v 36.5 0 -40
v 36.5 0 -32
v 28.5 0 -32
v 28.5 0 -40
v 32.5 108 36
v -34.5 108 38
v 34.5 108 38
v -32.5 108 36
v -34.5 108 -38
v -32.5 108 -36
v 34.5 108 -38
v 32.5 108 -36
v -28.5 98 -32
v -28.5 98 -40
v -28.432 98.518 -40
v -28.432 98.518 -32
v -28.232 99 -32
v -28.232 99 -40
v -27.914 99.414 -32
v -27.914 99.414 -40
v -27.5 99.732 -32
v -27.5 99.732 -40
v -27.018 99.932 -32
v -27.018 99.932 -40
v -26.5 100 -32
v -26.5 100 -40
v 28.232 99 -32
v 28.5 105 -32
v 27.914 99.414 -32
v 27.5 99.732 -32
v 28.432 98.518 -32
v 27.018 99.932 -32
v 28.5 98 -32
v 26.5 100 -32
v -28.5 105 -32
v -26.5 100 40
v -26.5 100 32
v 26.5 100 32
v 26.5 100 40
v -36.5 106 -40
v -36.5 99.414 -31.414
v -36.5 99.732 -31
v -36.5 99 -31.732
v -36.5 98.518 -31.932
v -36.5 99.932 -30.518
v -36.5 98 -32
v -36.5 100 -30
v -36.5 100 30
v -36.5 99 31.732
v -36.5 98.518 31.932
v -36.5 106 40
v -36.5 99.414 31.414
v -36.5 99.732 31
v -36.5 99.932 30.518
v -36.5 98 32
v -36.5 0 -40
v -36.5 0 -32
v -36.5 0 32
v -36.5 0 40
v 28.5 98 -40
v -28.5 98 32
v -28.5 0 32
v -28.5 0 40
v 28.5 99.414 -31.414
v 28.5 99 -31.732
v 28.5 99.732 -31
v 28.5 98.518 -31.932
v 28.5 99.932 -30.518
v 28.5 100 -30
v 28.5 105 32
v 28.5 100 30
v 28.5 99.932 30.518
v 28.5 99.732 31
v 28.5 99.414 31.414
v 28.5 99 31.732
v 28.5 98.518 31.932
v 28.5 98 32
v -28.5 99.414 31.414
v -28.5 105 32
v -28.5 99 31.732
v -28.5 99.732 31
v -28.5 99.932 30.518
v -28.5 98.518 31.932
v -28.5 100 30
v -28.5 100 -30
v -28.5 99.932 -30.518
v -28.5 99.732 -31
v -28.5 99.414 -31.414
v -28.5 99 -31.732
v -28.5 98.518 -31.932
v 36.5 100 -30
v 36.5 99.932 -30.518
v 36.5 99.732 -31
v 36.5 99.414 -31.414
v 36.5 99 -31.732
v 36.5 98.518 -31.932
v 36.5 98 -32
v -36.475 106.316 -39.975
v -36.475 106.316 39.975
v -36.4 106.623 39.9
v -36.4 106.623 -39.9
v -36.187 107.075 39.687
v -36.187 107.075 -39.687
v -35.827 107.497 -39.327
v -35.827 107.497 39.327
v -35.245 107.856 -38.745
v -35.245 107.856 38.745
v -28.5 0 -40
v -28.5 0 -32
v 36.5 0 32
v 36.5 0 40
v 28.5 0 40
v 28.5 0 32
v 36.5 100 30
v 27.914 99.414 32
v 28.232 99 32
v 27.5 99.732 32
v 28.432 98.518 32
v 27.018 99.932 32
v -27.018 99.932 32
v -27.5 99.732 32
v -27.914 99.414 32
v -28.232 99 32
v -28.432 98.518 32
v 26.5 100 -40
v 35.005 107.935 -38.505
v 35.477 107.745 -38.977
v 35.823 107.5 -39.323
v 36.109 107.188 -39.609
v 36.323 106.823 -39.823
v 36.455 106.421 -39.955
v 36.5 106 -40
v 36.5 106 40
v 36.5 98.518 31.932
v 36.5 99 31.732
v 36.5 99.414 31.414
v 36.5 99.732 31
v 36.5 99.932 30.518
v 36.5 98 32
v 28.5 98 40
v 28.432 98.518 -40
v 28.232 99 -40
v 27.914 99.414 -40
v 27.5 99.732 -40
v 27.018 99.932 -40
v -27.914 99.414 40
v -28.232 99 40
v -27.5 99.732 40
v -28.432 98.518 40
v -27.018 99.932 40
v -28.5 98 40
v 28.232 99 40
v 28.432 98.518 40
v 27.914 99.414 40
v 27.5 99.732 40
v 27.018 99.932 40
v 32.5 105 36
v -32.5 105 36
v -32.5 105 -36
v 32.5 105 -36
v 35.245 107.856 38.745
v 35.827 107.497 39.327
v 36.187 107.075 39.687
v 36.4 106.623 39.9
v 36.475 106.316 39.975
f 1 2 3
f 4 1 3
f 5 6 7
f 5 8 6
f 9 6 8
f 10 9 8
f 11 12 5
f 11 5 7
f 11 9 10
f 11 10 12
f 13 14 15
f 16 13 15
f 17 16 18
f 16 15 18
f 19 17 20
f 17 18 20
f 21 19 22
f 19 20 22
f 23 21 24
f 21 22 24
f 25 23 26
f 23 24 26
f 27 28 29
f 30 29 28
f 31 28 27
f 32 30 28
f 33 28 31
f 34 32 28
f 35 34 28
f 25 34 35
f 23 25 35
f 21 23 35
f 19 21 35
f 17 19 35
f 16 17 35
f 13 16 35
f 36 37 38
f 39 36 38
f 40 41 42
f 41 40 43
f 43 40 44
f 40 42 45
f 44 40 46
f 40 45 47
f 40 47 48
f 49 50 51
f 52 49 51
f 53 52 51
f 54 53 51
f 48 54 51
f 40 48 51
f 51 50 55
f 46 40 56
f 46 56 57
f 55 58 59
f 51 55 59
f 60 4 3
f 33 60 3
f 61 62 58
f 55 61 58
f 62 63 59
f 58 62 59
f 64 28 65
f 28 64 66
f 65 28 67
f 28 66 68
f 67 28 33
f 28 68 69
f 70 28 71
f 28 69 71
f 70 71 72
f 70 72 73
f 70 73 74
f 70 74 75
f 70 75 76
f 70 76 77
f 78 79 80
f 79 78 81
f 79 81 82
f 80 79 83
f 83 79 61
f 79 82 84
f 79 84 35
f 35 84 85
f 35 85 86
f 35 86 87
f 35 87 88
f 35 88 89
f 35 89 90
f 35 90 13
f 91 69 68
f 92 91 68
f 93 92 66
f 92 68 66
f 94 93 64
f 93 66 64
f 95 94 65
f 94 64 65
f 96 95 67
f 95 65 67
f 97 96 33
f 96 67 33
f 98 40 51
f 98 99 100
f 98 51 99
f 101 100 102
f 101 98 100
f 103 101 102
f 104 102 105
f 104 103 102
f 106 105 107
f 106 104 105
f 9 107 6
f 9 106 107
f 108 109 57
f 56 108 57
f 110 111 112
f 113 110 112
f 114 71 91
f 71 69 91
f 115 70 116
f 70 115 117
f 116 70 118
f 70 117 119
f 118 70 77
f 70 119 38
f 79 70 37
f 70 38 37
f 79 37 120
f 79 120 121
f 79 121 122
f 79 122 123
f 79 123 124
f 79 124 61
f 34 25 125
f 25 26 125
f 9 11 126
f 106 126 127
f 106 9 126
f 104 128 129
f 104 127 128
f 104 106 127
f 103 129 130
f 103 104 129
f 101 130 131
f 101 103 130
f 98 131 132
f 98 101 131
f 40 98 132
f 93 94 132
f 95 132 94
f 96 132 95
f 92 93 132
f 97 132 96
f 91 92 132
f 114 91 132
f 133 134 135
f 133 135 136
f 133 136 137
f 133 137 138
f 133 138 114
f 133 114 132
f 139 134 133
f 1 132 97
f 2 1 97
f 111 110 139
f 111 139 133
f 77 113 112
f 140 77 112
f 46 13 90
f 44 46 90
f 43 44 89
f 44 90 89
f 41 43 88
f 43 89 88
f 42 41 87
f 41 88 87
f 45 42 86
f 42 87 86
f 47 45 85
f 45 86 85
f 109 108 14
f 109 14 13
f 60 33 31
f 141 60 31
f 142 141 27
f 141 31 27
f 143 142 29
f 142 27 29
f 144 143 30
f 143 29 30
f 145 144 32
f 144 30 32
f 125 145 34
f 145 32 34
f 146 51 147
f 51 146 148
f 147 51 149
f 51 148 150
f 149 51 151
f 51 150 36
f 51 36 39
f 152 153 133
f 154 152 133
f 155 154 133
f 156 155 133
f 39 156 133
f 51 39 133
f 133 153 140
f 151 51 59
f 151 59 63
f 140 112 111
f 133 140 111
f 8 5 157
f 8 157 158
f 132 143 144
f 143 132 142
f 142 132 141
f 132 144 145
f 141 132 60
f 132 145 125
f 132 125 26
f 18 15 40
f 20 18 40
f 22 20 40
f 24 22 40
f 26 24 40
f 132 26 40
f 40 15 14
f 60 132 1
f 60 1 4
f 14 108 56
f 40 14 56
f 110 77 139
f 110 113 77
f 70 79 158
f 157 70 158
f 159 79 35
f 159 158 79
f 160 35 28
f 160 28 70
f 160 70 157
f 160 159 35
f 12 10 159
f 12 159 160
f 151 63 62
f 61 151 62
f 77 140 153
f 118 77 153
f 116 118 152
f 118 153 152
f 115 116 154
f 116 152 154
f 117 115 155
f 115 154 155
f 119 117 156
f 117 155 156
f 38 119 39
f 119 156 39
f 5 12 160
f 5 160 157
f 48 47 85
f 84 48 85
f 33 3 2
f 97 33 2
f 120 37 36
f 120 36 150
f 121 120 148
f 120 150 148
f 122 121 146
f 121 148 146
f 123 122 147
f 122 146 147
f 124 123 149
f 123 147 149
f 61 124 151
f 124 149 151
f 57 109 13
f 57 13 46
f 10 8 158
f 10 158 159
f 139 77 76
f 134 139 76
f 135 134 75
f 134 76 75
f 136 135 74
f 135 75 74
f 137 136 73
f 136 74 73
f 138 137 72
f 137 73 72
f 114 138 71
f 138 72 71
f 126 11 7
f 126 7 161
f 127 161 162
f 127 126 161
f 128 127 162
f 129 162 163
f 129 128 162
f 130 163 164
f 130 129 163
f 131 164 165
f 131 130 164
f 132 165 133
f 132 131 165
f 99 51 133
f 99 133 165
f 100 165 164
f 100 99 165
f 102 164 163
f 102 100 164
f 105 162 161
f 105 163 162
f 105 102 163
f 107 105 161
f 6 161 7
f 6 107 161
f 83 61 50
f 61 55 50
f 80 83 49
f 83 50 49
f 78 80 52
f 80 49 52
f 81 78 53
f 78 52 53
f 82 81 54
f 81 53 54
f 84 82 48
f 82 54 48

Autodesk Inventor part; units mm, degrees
ref_plane "YZ Plane" through (0, 0, 0) normal (1, 0, 0) x (0, 1, 0)
ref_plane "XZ Plane" through (0, 0, 0) normal (0, 1, 0) x (-1, 0, 0)
ref_plane "XY Plane" through (0, 0, 0) normal (0, 0, 1) x (1, 0, 0)
sketch "Sketch1" plane through (0, 0, 0) normal (0, 1, 0) x (-1, 0, 0)
  line L0 (-36.5, -40) -> (-36.5, 40)
  line L1 (36.5, 40) -> (36.5, -40)
  line L2 (-36.5, 40) -> (36.5, -40) construction
  line L3 (36.5, 40) -> (-36.5, -40) construction
  line L4 (36.5, 40) -> (36.5, 13)
  line L5 (-36.5, 40) -> (36.5, 40)
  line L6 (-36.5, -40) -> (-9.5, -40)
  line L7 (-36.5, -40) -> (18.5, -40)
  line L8 (36.5, -40) -> (-36.5, -40)
  line L9 (36.5, -40) -> (28.5, -40)
  line L10 (28.5, -40) -> (28.5, -32)
  line L11 (28.5, -32) -> (36.5, -32)
  line L12 (36.5, -32) -> (36.5, -40)
  line L13 (36.5, 40) -> (28.5, 40)
  line L14 (28.5, 40) -> (28.5, 32)
  line L15 (28.5, 32) -> (36.5, 32)
  line L16 (36.5, 32) -> (36.5, 40)
  line L17 (-36.5, 40) -> (-28.5, 40)
  line L18 (-28.5, 40) -> (-28.5, 32)
  line L19 (-28.5, 32) -> (-36.5, 32)
  line L20 (-36.5, 32) -> (-36.5, 40)
  line L21 (-36.5, -40) -> (-28.5, -40)
  line L22 (-28.5, -40) -> (-28.5, -32)
  line L23 (-28.5, -32) -> (-36.5, -32)
  line L24 (-36.5, -32) -> (-36.5, -40)
  dimension "d0" = 73
  dimension "d1" = 80
  dimension "d10" = 8
  dimension "d11" = 8
  dimension "d12" = 8
  dimension "d13" = 8
  dimension "d14" = 8
  dimension "d15" = 8
  dimension "d16" = 8
  dimension "d17" = 8
extrude "Extrusion1" add sketch "Sketch1" along normal blind 100 contours L0 L23 L22 L6 | L0 L5 L18 L19 | L10 L11 L1 L8 | L5 L1 L15 L14
sketch "Sketch2" plane through (0, 100, 0) normal (0, 1, 0) x (1, 0, 0)
  line L0 (-36.5, -40) -> (-28.5, -40) projected
  line L1 (-28.5, 32) -> (-28.5, 40) projected
  line L2 (-36.5, -40) -> (-28.5, -40)
  line L3 (-28.5, -40) -> (-28.5, 40)
  line L4 (-28.5, 40) -> (-36.5, 40)
  line L5 (-36.5, 40) -> (-36.5, -40)
  line L6 (-36.5, -32) -> (-36.5, -40) projected
  line L7 (36.5, -40) -> (36.5, -32) projected
  line L8 (-36.5, -40) -> (36.5, -40)
  line L9 (36.5, -40) -> (36.5, -32)
  line L10 (36.5, -32) -> (-36.5, -32)
  line L11 (-36.5, -32) -> (-36.5, -40)
  line L12 (28.5, -32) -> (28.5, -40) projected
  line L13 (36.5, 40) -> (28.5, 40) projected
  line L14 (28.5, -32) -> (36.5, -32)
  line L15 (36.5, -32) -> (36.5, 40)
  line L16 (36.5, 40) -> (28.5, 40)
  line L17 (28.5, 40) -> (28.5, -32)
  line L18 (-28.5, 32) -> (-28.5, 40) projected
  line L19 (28.5, 40) -> (28.5, 32) projected
  line L20 (-28.5, 40) -> (28.5, 40)
  line L21 (28.5, 40) -> (28.5, 32)
  line L22 (28.5, 32) -> (-28.5, 32)
  line L23 (-28.5, 32) -> (-28.5, 40)
  point P0 (0, 0)
extrude "Extrusion2" add sketch "Sketch2" along normal blind 8 contours L5 L10 L3 L0 | L3 L10 L12 L8 | L5 L4 L1 L3 L10 | L12 L10 L7 L8 | L1 L20 L17 L22 | L17 L13 L15 L10
sketch "Sketch3" plane through (0, 108, 0) normal (0, 1, 0) x (1, 0, 0)
  line L0 (28.5, -32) -> (-28.5, -32) projected
  line L1 (28.5, 32) -> (36.5, 32) projected
  line L2 (-28.5, -32) -> (28.5, -32)
  line L3 (28.5, -32) -> (28.5, 32)
  line L4 (28.5, 32) -> (-28.5, 32)
  line L5 (-28.5, 32) -> (-28.5, -32)
  line L6 (32.5, 36) -> (32.5, -36)
  line L7 (32.5, -36) -> (-32.5, -36)
  line L8 (-32.5, -36) -> (-32.5, 36)
  line L9 (-32.5, 36) -> (32.5, 36)
  point P0 (0, 0)
  dimension "d22" = 4
extrude "Extrusion3" cut sketch "Sketch3" against normal blind 3
fillet "Fillet1" radius 2 8 edges at (32.5, 100, 32) (-28.5, 100, -36) (-28.5, 100, 36) (28.5, 100, -36) (-32.5, 100, 32) (-32.5, 100, -32) (28.5, 100, 36) (32.5, 100, -32)
fillet "Fillet2" radius 2 4 edges at (-36.5, 108, 0) (0, 108, 40) (36.5, 108, 0) (0, 108, -40)
properties part number "Hood_base"
